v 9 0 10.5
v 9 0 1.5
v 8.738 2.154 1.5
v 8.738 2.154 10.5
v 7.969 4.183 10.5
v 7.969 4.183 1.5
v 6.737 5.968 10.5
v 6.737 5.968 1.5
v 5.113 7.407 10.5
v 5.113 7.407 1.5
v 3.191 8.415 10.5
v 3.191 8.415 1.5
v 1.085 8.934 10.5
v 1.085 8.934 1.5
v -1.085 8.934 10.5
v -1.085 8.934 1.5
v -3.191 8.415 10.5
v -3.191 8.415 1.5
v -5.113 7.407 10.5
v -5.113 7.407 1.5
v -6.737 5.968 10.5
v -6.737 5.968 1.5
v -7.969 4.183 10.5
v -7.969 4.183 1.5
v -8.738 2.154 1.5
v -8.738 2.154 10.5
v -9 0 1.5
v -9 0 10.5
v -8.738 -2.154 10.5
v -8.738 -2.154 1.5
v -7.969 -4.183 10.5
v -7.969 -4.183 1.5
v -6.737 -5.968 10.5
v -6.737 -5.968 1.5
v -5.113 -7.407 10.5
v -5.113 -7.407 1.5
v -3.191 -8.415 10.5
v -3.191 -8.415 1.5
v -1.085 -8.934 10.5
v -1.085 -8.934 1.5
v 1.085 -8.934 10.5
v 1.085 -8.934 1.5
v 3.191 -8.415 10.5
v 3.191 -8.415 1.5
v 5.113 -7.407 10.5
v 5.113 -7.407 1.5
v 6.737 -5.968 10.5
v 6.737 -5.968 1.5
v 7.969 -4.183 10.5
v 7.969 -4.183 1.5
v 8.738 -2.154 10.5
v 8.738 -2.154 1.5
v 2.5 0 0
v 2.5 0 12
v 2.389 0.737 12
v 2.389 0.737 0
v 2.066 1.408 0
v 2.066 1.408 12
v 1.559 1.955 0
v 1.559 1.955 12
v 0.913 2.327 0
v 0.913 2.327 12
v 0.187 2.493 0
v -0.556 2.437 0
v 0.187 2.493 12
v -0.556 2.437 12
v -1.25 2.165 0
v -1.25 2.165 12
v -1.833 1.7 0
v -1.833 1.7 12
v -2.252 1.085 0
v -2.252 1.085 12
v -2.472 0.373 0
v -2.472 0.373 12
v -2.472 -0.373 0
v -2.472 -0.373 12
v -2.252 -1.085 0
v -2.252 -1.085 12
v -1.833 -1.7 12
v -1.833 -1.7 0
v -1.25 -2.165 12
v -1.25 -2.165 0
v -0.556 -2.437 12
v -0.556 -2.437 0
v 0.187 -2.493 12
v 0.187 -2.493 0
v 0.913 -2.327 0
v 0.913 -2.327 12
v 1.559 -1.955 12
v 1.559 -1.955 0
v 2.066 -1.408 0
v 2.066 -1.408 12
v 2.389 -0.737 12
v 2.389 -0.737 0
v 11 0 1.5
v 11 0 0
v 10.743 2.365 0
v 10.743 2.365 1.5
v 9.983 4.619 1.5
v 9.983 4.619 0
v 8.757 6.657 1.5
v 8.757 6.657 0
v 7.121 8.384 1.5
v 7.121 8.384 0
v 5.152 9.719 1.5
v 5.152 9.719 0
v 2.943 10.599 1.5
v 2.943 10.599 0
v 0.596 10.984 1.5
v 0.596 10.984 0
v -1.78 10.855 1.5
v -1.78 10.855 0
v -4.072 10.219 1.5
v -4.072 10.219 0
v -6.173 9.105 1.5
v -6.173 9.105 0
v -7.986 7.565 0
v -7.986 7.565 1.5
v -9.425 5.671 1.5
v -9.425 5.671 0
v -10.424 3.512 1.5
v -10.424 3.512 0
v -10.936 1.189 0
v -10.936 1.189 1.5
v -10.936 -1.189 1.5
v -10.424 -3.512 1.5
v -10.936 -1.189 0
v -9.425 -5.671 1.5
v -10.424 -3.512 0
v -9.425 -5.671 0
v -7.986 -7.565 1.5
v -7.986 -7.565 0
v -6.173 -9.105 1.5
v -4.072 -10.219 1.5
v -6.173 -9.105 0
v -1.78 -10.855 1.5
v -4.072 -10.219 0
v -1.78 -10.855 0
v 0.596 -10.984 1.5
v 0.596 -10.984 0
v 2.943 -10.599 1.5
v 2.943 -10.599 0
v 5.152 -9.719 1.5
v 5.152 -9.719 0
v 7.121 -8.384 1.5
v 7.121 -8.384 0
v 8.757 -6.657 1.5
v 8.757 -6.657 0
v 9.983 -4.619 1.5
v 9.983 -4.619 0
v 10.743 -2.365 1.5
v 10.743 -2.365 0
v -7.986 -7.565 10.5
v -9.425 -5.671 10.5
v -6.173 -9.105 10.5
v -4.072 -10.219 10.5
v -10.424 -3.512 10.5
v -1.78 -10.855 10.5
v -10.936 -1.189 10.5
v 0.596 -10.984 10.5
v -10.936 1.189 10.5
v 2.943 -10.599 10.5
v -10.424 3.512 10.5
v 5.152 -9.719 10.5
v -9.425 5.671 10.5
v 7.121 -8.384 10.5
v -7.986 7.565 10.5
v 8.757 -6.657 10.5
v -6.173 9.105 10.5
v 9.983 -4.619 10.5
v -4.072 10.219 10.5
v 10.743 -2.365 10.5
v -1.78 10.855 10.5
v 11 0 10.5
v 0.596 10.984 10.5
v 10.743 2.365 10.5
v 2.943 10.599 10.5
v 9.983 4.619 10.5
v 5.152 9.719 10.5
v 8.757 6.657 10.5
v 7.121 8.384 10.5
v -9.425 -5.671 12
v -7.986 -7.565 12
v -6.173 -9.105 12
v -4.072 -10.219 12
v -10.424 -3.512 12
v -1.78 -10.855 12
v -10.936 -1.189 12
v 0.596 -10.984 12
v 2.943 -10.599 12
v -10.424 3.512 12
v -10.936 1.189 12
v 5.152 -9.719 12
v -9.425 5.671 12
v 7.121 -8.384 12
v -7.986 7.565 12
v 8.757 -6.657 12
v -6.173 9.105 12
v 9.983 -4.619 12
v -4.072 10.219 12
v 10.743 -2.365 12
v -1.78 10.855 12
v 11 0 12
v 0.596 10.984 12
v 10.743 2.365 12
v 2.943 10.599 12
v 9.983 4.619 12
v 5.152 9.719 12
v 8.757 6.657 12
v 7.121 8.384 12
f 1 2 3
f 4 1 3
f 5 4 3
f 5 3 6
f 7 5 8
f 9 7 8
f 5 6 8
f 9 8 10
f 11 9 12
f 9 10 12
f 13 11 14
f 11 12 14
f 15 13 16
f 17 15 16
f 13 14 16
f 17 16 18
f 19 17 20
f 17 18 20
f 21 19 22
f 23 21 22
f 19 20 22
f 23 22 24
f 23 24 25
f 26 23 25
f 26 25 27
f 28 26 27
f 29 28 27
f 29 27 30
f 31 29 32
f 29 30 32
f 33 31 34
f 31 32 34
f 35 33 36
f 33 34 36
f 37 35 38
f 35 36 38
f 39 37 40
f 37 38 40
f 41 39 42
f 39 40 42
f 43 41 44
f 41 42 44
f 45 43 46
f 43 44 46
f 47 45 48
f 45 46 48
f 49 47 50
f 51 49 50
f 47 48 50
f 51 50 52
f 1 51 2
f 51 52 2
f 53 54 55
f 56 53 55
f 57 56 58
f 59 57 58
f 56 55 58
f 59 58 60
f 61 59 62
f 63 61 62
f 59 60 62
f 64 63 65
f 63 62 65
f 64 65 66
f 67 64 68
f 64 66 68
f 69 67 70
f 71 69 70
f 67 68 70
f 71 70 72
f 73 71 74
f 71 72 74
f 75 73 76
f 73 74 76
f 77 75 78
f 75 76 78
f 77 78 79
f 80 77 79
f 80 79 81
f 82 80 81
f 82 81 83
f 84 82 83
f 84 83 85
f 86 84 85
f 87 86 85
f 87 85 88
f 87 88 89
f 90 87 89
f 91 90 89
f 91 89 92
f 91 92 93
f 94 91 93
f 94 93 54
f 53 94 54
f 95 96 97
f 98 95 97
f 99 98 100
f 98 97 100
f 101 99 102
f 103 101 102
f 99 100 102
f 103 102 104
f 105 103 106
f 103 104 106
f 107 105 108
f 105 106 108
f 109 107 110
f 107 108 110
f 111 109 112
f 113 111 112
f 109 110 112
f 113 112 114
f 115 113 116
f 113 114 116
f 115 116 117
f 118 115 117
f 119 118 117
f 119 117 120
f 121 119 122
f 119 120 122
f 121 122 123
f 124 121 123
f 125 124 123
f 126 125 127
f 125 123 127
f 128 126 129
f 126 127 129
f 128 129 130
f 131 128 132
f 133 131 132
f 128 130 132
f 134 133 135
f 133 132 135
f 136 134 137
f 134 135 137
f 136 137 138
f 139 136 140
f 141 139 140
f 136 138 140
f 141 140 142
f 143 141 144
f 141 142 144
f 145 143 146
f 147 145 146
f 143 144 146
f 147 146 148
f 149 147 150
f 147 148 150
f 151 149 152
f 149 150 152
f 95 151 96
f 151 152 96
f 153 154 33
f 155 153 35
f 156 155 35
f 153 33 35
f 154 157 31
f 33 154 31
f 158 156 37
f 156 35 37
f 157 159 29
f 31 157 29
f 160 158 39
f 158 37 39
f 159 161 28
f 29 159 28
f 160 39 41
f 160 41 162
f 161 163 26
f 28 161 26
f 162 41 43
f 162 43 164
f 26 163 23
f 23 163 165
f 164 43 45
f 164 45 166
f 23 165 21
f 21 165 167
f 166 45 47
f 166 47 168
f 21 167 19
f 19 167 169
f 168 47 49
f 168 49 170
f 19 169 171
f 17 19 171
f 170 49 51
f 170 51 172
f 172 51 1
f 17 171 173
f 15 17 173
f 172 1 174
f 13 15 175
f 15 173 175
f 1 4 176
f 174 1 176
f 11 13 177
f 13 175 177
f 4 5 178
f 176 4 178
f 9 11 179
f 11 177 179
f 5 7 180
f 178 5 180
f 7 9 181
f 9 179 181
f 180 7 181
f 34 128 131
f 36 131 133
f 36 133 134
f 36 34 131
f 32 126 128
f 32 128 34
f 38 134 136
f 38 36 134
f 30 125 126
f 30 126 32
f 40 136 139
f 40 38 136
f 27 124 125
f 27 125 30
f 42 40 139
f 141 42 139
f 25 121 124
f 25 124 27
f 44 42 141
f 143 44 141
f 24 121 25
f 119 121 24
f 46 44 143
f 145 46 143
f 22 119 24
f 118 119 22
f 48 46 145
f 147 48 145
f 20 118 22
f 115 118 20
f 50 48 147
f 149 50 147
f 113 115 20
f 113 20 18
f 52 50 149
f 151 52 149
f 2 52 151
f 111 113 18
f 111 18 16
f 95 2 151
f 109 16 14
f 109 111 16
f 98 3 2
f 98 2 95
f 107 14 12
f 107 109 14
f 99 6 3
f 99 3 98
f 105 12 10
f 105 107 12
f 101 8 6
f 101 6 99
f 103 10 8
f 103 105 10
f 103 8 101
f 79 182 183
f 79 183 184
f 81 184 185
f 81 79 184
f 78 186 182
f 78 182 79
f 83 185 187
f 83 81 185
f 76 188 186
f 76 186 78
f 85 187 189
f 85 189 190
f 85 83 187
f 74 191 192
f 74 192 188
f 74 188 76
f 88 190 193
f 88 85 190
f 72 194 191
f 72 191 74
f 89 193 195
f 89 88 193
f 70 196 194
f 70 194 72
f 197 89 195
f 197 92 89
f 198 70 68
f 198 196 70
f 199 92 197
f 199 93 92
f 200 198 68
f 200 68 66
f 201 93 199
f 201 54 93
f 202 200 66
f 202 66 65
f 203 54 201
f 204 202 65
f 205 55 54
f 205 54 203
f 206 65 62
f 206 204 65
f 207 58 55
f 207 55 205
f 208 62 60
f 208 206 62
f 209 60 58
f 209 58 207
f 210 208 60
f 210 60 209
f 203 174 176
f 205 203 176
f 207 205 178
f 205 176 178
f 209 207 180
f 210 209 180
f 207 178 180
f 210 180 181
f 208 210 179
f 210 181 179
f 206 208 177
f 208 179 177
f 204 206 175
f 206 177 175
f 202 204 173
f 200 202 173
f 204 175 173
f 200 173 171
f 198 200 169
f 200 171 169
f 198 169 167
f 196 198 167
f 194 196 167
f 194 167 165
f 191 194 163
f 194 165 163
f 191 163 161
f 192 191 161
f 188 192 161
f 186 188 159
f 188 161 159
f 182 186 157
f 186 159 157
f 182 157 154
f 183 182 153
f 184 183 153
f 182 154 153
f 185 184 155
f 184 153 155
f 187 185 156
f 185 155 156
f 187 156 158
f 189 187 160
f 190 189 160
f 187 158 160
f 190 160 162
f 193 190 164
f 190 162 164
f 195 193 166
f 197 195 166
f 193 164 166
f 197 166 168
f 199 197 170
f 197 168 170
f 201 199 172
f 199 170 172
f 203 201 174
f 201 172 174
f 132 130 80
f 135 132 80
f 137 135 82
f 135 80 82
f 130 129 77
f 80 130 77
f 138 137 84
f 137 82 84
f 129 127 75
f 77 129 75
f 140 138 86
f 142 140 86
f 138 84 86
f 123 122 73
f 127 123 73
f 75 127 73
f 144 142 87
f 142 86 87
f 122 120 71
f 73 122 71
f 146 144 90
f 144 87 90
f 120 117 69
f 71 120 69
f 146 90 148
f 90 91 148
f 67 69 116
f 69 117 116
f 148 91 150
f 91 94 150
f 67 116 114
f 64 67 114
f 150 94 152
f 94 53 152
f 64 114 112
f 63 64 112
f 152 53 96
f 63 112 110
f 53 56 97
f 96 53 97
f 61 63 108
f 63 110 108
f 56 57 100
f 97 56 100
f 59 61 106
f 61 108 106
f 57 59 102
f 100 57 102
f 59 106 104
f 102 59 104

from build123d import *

# Parameters (mm, degrees)
ESQUISSE1_R                  = 11
BOSS_EXTRU_1_DEPTH           = 1.5
ESQUISSE2_R                  = 9
BOSS_EXTRU_2_DEPTH           = 9
ESQUISSE3_R                  = 11
BOSS_EXTRU_3_DEPTH           = 1.5
ESQUISSE4_R                  = 2.5
ENL_V_MAT_EXTRU_1_DEPTH      = 1
ENL_V_MAT_EXTRU_1_DEPTH_BACK = 13


with BuildPart() as part:
    # Esquisse1 → Boss.-Extru.1 (new body)
    with BuildSketch(Plane.XY):
        Circle(ESQUISSE1_R)
    extrude(amount=BOSS_EXTRU_1_DEPTH)

    # Esquisse2 → Boss.-Extru.2 (add)
    with BuildSketch(Plane.XY.offset(1.5)):
        Circle(ESQUISSE2_R)
    extrude(amount=BOSS_EXTRU_2_DEPTH)

    # Esquisse3 → Boss.-Extru.3 (add)
    with BuildSketch(Plane.XY.offset(10.5)):
        Circle(ESQUISSE3_R)
    extrude(amount=BOSS_EXTRU_3_DEPTH)

    # Esquisse4 → Enlèv. mat.-Extru.1 (cut, two sides)
    with BuildSketch(Plane.XY.offset(12)) as enl_v_mat_extru_1_sk:
        Circle(ESQUISSE4_R)
    extrude(amount=ENL_V_MAT_EXTRU_1_DEPTH, mode=Mode.SUBTRACT)
    extrude(enl_v_mat_extru_1_sk.sketch, amount=-ENL_V_MAT_EXTRU_1_DEPTH_BACK, mode=Mode.SUBTRACT)


solid = part.part
